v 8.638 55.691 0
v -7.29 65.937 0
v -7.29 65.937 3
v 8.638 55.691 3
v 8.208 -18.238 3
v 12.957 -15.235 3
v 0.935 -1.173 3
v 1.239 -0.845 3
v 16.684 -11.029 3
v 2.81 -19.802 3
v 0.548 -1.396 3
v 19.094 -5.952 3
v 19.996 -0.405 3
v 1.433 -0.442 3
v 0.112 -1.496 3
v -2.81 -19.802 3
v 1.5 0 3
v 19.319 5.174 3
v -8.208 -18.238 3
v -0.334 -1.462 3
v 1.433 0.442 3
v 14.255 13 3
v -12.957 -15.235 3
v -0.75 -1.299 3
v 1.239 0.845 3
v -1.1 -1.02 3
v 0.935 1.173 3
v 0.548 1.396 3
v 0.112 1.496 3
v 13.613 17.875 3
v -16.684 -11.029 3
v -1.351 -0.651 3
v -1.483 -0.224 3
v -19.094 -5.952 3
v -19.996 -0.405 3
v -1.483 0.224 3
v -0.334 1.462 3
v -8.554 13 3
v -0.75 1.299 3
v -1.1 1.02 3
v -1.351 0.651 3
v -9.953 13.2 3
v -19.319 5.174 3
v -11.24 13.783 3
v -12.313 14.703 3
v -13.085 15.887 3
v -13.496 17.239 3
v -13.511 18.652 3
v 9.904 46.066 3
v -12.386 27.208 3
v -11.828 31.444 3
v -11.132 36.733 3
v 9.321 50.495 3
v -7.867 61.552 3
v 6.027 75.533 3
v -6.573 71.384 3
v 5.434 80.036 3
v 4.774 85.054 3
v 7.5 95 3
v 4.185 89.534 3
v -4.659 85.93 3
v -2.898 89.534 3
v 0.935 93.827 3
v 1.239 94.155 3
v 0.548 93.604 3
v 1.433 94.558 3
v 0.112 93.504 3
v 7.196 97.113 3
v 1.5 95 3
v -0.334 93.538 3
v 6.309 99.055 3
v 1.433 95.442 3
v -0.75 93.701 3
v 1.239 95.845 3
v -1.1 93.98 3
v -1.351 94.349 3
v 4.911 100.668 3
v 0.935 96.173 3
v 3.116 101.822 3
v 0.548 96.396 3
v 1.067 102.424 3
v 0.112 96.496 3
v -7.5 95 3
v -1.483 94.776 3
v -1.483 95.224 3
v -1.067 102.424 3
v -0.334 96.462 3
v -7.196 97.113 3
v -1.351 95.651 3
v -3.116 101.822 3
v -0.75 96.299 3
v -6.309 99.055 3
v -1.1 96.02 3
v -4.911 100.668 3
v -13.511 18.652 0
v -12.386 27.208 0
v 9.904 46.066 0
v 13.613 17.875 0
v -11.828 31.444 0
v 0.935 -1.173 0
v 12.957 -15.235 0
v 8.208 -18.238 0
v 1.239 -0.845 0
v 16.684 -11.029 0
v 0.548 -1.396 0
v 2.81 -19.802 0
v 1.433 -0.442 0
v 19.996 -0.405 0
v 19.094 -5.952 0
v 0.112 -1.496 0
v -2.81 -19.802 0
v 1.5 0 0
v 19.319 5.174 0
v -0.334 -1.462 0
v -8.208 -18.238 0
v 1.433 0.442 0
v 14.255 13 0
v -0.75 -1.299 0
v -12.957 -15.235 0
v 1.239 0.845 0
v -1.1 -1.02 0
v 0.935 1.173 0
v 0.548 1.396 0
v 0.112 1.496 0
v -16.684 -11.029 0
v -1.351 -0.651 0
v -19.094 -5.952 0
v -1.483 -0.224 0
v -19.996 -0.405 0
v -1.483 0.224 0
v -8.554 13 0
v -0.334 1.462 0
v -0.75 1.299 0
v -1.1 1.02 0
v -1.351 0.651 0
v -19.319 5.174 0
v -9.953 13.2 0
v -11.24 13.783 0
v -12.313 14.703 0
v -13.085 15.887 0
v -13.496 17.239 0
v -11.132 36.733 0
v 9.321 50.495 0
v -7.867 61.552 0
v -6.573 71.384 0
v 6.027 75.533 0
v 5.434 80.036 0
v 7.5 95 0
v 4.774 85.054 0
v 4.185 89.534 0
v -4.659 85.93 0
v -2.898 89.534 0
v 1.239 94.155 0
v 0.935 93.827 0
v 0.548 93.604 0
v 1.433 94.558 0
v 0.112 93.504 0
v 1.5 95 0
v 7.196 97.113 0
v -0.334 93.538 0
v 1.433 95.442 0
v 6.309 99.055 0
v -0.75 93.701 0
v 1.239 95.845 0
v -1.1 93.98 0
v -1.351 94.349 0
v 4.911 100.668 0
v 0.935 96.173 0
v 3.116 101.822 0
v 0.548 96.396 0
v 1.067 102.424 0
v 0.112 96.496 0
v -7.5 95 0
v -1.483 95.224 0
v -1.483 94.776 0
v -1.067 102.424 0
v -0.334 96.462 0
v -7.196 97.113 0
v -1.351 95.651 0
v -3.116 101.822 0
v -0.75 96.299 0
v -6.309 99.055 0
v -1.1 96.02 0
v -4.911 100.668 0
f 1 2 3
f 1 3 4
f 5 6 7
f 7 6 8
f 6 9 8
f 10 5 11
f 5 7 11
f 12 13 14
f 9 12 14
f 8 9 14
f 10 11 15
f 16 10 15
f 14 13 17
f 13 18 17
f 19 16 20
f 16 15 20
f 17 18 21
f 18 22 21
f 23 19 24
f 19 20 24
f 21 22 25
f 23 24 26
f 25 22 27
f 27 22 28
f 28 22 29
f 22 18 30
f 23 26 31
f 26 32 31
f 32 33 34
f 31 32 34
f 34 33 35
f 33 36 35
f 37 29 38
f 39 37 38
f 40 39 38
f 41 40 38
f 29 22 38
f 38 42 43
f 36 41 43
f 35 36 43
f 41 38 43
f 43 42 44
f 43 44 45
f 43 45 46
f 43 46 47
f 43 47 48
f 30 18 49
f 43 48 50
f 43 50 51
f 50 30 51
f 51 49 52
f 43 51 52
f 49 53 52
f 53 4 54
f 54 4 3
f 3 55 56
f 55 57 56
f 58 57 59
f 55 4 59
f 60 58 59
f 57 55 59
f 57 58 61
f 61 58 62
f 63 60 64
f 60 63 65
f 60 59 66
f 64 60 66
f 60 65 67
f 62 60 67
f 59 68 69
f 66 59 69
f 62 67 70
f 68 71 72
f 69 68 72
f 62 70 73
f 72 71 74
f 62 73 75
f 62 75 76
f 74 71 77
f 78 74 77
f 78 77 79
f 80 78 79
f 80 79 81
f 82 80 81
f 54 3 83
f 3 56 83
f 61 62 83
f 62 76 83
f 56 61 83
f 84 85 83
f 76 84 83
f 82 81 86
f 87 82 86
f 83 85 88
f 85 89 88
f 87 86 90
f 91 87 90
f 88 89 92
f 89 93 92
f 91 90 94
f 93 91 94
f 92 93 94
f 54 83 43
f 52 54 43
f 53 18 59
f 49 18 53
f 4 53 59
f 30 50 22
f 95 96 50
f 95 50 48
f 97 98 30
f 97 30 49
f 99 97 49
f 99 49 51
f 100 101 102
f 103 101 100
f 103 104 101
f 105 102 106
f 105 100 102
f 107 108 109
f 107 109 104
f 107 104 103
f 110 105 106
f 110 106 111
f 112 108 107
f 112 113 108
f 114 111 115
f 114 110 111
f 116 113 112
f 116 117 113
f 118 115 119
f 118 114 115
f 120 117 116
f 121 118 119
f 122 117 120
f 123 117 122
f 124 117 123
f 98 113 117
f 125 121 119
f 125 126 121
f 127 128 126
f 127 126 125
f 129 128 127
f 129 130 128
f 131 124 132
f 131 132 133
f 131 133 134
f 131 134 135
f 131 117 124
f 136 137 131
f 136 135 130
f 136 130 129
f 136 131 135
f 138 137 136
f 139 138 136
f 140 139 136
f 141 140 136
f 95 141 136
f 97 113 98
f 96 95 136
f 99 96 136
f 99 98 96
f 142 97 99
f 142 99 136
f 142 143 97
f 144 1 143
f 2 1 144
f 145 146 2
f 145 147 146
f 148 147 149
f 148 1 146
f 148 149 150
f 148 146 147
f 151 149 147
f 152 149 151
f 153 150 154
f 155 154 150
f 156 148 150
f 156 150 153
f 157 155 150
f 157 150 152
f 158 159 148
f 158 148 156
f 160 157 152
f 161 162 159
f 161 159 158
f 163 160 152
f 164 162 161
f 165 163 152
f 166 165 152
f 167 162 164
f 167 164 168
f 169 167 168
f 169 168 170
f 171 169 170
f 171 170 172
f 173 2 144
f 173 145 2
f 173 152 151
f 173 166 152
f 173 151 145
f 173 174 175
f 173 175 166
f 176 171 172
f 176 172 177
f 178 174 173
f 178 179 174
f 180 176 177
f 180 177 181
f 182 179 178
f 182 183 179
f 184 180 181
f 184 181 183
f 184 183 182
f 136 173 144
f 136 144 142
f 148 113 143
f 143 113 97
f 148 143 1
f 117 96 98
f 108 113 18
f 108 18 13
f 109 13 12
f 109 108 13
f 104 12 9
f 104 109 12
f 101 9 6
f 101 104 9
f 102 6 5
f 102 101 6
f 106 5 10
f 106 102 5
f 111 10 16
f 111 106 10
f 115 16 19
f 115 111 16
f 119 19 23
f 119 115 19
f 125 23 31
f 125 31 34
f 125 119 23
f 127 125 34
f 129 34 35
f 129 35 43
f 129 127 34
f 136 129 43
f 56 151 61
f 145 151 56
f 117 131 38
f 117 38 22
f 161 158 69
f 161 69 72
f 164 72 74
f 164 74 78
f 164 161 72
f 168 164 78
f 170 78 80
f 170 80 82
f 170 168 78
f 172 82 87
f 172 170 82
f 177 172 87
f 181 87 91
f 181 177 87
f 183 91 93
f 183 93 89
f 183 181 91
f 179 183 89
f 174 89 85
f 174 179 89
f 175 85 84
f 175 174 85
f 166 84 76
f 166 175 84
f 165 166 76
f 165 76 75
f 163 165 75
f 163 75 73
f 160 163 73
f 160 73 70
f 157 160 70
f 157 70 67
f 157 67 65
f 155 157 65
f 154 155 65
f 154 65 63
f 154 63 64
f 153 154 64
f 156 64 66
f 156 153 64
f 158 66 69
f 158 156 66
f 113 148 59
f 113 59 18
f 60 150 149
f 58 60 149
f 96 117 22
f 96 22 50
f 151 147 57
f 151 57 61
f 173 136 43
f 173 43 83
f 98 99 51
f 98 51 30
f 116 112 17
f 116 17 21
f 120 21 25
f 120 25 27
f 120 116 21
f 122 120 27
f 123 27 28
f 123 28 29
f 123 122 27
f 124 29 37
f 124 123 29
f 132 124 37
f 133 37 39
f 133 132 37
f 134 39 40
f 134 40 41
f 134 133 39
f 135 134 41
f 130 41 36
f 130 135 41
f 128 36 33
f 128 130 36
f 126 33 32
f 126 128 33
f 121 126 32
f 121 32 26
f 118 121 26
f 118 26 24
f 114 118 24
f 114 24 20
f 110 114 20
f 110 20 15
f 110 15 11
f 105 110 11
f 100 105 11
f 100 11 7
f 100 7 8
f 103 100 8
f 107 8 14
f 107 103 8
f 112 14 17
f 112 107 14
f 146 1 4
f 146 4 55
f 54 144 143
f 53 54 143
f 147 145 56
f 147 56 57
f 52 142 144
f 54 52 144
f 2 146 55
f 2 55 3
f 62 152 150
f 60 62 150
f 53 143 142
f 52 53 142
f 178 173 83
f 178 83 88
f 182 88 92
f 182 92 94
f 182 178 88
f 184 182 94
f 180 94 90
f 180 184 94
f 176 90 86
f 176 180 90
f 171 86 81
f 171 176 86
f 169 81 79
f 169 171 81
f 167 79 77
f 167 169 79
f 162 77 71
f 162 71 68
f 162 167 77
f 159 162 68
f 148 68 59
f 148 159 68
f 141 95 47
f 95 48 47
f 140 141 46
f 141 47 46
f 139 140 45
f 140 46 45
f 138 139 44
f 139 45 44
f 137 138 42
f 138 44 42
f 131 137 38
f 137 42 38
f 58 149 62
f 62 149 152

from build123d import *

# Parameters (mm, degrees)
SKETCH1_R           = 1.5
BOSS_EXTRUDE1_DEPTH = 3
FILLET1_R           = 5


with BuildPart() as part:
    # Sketch1 → Boss-Extrude1 (new body)
    with BuildSketch(Plane.XY):
        with BuildLine():
            Line((-19.319264806, 5.173587474), (-7.5, 95))
            ThreePointArc((-7.5, 95), (0, 102.5), (7.5, 95))
            Line((7.5, 95), (19.319264806, 5.173587474))
            ThreePointArc((19.319264806, 5.173587474), (0, -20), (-19.319264806, 5.173587474))
        make_face()
        with Locations((0, 95)):
            Circle(SKETCH1_R, mode=Mode.SUBTRACT)
        Circle(SKETCH1_R, mode=Mode.SUBTRACT)
        Polygon((-14.254996232, 13), (14.254996232, 13), (-12.38556129, 27.207705563), align=None, mode=Mode.SUBTRACT)
        Polygon((-2.898329399, 89.534418399), (4.184678022, 89.534418399), (4.774242146, 85.053731057), align=None, mode=Mode.SUBTRACT)
        Polygon((-11.828187859, 31.443743635), (13.613494732, 17.875411404), (9.904156147, 46.066384645), align=None, mode=Mode.SUBTRACT)
        Polygon((-11.132206149, 36.73320463), (-7.866560771, 61.552109505), (9.321386275, 50.495435676), align=None, mode=Mode.SUBTRACT)
        Polygon((-7.289587852, 65.937103693), (8.637709175, 55.691381633), (6.027006268, 75.532723726), align=None, mode=Mode.SUBTRACT)
        Polygon((-6.572917095, 71.383801447), (5.434465341, 80.036034774), (-4.658887227, 85.930428438), align=None, mode=Mode.SUBTRACT)
    extrude(amount=BOSS_EXTRUDE1_DEPTH)

    # Fillet1
    fillet1_edges = [part.edges().sort_by_distance(p)[0] for p in [
        (-14.254996232, 13, 1.5),
    ]]
    fillet(fillet1_edges, radius=FILLET1_R)


solid = part.part
